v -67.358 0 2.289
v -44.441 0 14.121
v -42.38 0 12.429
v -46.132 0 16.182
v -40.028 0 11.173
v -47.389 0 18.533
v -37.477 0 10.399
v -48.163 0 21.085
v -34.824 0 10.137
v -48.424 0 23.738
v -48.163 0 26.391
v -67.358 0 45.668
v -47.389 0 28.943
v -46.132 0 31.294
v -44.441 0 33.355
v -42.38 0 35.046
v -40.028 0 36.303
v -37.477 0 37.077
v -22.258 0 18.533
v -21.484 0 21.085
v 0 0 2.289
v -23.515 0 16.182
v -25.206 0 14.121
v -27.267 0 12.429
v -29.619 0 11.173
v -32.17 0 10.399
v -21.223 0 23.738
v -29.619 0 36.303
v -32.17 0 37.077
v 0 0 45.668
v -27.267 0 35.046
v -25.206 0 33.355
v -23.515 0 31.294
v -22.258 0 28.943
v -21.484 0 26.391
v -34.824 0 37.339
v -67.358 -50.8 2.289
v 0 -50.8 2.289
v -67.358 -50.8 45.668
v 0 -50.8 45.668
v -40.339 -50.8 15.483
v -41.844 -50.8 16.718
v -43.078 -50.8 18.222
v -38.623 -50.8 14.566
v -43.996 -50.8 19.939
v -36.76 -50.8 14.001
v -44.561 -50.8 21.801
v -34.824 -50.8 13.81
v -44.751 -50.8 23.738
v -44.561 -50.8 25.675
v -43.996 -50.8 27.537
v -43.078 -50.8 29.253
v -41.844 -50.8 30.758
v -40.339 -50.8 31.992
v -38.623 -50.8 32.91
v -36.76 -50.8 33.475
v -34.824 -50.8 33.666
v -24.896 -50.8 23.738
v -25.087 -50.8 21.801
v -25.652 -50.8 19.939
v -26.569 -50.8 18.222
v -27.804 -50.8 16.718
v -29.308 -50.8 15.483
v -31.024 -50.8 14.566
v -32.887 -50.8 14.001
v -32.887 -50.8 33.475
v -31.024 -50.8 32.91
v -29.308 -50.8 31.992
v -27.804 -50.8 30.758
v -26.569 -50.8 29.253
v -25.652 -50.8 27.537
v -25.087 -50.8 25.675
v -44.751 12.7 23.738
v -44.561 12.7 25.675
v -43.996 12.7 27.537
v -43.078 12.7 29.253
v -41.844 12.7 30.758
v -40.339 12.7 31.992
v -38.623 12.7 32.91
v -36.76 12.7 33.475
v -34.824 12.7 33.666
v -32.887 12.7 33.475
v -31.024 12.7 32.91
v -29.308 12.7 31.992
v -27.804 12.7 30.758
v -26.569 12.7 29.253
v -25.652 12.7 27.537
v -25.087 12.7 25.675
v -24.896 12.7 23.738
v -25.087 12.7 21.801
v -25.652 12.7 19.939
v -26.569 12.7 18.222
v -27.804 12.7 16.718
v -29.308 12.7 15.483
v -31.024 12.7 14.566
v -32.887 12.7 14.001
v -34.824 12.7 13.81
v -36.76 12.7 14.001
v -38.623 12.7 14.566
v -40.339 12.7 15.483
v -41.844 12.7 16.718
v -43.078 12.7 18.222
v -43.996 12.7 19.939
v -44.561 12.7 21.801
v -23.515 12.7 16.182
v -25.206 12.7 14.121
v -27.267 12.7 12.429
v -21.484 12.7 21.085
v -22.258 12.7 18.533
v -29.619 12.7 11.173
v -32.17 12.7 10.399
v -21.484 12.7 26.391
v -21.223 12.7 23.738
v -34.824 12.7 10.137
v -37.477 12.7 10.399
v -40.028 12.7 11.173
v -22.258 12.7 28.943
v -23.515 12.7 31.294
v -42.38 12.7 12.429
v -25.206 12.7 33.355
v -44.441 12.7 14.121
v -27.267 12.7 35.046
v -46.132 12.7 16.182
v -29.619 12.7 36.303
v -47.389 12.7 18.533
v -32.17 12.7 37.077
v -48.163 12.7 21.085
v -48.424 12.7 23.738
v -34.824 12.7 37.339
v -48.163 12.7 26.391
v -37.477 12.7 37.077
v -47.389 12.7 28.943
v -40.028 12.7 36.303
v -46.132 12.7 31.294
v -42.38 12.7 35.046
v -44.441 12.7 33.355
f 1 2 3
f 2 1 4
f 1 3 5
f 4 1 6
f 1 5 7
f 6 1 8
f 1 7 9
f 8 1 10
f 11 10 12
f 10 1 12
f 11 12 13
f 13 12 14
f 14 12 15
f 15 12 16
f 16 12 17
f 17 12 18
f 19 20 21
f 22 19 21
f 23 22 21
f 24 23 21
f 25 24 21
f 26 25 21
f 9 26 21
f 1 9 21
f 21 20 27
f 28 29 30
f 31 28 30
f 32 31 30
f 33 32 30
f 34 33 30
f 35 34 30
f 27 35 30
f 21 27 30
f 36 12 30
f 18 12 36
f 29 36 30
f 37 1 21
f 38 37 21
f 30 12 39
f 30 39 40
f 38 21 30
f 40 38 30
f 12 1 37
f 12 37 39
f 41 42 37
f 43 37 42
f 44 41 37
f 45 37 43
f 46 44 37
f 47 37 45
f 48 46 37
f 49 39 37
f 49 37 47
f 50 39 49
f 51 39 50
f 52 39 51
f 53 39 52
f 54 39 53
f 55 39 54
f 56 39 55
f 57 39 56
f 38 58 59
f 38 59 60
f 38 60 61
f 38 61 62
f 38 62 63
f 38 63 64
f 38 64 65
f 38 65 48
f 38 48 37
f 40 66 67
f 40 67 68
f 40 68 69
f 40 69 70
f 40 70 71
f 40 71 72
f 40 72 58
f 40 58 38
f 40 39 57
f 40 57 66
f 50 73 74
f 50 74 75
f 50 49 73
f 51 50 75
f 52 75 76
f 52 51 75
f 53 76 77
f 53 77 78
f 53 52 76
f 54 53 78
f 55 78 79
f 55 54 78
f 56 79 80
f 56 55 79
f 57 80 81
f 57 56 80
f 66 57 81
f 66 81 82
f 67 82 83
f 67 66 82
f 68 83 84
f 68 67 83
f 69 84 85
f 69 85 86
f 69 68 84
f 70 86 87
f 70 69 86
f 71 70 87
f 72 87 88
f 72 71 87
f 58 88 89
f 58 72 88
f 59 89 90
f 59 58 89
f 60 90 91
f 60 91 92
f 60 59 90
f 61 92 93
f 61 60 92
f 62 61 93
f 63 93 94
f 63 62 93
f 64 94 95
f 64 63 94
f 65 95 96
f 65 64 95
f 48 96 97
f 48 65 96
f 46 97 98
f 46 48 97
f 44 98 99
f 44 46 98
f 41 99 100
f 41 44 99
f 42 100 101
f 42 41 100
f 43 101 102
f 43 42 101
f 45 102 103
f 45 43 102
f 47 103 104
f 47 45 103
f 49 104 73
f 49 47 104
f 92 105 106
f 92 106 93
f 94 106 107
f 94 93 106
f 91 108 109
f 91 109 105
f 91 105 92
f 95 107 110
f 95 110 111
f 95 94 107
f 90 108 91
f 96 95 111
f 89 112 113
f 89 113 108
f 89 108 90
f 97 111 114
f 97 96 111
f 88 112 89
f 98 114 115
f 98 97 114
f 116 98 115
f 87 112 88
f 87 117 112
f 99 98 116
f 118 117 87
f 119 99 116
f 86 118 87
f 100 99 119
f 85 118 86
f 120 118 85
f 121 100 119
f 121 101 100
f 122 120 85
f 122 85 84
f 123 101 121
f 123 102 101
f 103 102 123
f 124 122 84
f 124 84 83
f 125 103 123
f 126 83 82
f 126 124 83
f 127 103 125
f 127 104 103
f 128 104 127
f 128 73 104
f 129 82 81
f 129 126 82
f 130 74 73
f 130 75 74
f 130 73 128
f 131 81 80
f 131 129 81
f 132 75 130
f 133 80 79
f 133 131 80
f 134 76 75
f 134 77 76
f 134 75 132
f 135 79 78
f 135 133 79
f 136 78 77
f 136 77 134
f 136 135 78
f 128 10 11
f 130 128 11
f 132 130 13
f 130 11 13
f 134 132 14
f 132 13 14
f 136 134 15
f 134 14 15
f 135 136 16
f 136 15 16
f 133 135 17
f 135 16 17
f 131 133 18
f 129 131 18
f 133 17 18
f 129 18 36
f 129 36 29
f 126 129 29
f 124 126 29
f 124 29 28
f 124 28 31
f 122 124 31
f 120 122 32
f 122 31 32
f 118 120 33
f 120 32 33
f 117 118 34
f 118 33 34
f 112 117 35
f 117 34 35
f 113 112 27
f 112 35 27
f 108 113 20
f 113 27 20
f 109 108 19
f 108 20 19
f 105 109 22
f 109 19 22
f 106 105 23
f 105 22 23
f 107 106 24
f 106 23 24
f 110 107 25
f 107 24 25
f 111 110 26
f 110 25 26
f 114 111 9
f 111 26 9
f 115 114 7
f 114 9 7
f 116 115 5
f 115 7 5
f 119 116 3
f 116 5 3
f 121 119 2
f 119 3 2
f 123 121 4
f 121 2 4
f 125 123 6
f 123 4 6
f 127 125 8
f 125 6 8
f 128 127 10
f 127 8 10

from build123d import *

# Parameters (mm, degrees)
F0_W     = 67.357816
F0_H     = 43.378917
F1_DEPTH = 50.8
F2_R     = 9.927663
F3_DEPTH = 50.8
F2_R_2   = 13.600689
F4_DEPTH = 12.7


with BuildPart() as f1:
    # F0 (on Front) → F1 (new body)
    with BuildSketch(Plane.XZ):
        with Locations((-33.678908, 23.978901)):
            Rectangle(F0_W, F0_H)
    extrude(amount=F1_DEPTH)

    # F2 (on face) → F3 (cut)
    with BuildSketch(Plane(origin=(0, 0, 0), x_dir=(-1, 0, 0), z_dir=(0, 1, 0))):
        with Locations((34.82363, 23.737906)):
            Circle(F2_R)
    extrude(amount=-F3_DEPTH, mode=Mode.SUBTRACT)

    # F2 (on face) → F4 (join)
    with BuildSketch(Plane(origin=(0, 0, 0), x_dir=(-1, 0, 0), z_dir=(0, 1, 0))):
        with Locations((34.82363, 23.737906)):
            Circle(F2_R_2)
        with Locations((34.82363, 23.737906)):
            Circle(F2_R, mode=Mode.SUBTRACT)
    extrude(amount=F4_DEPTH)


solid = f1.part
